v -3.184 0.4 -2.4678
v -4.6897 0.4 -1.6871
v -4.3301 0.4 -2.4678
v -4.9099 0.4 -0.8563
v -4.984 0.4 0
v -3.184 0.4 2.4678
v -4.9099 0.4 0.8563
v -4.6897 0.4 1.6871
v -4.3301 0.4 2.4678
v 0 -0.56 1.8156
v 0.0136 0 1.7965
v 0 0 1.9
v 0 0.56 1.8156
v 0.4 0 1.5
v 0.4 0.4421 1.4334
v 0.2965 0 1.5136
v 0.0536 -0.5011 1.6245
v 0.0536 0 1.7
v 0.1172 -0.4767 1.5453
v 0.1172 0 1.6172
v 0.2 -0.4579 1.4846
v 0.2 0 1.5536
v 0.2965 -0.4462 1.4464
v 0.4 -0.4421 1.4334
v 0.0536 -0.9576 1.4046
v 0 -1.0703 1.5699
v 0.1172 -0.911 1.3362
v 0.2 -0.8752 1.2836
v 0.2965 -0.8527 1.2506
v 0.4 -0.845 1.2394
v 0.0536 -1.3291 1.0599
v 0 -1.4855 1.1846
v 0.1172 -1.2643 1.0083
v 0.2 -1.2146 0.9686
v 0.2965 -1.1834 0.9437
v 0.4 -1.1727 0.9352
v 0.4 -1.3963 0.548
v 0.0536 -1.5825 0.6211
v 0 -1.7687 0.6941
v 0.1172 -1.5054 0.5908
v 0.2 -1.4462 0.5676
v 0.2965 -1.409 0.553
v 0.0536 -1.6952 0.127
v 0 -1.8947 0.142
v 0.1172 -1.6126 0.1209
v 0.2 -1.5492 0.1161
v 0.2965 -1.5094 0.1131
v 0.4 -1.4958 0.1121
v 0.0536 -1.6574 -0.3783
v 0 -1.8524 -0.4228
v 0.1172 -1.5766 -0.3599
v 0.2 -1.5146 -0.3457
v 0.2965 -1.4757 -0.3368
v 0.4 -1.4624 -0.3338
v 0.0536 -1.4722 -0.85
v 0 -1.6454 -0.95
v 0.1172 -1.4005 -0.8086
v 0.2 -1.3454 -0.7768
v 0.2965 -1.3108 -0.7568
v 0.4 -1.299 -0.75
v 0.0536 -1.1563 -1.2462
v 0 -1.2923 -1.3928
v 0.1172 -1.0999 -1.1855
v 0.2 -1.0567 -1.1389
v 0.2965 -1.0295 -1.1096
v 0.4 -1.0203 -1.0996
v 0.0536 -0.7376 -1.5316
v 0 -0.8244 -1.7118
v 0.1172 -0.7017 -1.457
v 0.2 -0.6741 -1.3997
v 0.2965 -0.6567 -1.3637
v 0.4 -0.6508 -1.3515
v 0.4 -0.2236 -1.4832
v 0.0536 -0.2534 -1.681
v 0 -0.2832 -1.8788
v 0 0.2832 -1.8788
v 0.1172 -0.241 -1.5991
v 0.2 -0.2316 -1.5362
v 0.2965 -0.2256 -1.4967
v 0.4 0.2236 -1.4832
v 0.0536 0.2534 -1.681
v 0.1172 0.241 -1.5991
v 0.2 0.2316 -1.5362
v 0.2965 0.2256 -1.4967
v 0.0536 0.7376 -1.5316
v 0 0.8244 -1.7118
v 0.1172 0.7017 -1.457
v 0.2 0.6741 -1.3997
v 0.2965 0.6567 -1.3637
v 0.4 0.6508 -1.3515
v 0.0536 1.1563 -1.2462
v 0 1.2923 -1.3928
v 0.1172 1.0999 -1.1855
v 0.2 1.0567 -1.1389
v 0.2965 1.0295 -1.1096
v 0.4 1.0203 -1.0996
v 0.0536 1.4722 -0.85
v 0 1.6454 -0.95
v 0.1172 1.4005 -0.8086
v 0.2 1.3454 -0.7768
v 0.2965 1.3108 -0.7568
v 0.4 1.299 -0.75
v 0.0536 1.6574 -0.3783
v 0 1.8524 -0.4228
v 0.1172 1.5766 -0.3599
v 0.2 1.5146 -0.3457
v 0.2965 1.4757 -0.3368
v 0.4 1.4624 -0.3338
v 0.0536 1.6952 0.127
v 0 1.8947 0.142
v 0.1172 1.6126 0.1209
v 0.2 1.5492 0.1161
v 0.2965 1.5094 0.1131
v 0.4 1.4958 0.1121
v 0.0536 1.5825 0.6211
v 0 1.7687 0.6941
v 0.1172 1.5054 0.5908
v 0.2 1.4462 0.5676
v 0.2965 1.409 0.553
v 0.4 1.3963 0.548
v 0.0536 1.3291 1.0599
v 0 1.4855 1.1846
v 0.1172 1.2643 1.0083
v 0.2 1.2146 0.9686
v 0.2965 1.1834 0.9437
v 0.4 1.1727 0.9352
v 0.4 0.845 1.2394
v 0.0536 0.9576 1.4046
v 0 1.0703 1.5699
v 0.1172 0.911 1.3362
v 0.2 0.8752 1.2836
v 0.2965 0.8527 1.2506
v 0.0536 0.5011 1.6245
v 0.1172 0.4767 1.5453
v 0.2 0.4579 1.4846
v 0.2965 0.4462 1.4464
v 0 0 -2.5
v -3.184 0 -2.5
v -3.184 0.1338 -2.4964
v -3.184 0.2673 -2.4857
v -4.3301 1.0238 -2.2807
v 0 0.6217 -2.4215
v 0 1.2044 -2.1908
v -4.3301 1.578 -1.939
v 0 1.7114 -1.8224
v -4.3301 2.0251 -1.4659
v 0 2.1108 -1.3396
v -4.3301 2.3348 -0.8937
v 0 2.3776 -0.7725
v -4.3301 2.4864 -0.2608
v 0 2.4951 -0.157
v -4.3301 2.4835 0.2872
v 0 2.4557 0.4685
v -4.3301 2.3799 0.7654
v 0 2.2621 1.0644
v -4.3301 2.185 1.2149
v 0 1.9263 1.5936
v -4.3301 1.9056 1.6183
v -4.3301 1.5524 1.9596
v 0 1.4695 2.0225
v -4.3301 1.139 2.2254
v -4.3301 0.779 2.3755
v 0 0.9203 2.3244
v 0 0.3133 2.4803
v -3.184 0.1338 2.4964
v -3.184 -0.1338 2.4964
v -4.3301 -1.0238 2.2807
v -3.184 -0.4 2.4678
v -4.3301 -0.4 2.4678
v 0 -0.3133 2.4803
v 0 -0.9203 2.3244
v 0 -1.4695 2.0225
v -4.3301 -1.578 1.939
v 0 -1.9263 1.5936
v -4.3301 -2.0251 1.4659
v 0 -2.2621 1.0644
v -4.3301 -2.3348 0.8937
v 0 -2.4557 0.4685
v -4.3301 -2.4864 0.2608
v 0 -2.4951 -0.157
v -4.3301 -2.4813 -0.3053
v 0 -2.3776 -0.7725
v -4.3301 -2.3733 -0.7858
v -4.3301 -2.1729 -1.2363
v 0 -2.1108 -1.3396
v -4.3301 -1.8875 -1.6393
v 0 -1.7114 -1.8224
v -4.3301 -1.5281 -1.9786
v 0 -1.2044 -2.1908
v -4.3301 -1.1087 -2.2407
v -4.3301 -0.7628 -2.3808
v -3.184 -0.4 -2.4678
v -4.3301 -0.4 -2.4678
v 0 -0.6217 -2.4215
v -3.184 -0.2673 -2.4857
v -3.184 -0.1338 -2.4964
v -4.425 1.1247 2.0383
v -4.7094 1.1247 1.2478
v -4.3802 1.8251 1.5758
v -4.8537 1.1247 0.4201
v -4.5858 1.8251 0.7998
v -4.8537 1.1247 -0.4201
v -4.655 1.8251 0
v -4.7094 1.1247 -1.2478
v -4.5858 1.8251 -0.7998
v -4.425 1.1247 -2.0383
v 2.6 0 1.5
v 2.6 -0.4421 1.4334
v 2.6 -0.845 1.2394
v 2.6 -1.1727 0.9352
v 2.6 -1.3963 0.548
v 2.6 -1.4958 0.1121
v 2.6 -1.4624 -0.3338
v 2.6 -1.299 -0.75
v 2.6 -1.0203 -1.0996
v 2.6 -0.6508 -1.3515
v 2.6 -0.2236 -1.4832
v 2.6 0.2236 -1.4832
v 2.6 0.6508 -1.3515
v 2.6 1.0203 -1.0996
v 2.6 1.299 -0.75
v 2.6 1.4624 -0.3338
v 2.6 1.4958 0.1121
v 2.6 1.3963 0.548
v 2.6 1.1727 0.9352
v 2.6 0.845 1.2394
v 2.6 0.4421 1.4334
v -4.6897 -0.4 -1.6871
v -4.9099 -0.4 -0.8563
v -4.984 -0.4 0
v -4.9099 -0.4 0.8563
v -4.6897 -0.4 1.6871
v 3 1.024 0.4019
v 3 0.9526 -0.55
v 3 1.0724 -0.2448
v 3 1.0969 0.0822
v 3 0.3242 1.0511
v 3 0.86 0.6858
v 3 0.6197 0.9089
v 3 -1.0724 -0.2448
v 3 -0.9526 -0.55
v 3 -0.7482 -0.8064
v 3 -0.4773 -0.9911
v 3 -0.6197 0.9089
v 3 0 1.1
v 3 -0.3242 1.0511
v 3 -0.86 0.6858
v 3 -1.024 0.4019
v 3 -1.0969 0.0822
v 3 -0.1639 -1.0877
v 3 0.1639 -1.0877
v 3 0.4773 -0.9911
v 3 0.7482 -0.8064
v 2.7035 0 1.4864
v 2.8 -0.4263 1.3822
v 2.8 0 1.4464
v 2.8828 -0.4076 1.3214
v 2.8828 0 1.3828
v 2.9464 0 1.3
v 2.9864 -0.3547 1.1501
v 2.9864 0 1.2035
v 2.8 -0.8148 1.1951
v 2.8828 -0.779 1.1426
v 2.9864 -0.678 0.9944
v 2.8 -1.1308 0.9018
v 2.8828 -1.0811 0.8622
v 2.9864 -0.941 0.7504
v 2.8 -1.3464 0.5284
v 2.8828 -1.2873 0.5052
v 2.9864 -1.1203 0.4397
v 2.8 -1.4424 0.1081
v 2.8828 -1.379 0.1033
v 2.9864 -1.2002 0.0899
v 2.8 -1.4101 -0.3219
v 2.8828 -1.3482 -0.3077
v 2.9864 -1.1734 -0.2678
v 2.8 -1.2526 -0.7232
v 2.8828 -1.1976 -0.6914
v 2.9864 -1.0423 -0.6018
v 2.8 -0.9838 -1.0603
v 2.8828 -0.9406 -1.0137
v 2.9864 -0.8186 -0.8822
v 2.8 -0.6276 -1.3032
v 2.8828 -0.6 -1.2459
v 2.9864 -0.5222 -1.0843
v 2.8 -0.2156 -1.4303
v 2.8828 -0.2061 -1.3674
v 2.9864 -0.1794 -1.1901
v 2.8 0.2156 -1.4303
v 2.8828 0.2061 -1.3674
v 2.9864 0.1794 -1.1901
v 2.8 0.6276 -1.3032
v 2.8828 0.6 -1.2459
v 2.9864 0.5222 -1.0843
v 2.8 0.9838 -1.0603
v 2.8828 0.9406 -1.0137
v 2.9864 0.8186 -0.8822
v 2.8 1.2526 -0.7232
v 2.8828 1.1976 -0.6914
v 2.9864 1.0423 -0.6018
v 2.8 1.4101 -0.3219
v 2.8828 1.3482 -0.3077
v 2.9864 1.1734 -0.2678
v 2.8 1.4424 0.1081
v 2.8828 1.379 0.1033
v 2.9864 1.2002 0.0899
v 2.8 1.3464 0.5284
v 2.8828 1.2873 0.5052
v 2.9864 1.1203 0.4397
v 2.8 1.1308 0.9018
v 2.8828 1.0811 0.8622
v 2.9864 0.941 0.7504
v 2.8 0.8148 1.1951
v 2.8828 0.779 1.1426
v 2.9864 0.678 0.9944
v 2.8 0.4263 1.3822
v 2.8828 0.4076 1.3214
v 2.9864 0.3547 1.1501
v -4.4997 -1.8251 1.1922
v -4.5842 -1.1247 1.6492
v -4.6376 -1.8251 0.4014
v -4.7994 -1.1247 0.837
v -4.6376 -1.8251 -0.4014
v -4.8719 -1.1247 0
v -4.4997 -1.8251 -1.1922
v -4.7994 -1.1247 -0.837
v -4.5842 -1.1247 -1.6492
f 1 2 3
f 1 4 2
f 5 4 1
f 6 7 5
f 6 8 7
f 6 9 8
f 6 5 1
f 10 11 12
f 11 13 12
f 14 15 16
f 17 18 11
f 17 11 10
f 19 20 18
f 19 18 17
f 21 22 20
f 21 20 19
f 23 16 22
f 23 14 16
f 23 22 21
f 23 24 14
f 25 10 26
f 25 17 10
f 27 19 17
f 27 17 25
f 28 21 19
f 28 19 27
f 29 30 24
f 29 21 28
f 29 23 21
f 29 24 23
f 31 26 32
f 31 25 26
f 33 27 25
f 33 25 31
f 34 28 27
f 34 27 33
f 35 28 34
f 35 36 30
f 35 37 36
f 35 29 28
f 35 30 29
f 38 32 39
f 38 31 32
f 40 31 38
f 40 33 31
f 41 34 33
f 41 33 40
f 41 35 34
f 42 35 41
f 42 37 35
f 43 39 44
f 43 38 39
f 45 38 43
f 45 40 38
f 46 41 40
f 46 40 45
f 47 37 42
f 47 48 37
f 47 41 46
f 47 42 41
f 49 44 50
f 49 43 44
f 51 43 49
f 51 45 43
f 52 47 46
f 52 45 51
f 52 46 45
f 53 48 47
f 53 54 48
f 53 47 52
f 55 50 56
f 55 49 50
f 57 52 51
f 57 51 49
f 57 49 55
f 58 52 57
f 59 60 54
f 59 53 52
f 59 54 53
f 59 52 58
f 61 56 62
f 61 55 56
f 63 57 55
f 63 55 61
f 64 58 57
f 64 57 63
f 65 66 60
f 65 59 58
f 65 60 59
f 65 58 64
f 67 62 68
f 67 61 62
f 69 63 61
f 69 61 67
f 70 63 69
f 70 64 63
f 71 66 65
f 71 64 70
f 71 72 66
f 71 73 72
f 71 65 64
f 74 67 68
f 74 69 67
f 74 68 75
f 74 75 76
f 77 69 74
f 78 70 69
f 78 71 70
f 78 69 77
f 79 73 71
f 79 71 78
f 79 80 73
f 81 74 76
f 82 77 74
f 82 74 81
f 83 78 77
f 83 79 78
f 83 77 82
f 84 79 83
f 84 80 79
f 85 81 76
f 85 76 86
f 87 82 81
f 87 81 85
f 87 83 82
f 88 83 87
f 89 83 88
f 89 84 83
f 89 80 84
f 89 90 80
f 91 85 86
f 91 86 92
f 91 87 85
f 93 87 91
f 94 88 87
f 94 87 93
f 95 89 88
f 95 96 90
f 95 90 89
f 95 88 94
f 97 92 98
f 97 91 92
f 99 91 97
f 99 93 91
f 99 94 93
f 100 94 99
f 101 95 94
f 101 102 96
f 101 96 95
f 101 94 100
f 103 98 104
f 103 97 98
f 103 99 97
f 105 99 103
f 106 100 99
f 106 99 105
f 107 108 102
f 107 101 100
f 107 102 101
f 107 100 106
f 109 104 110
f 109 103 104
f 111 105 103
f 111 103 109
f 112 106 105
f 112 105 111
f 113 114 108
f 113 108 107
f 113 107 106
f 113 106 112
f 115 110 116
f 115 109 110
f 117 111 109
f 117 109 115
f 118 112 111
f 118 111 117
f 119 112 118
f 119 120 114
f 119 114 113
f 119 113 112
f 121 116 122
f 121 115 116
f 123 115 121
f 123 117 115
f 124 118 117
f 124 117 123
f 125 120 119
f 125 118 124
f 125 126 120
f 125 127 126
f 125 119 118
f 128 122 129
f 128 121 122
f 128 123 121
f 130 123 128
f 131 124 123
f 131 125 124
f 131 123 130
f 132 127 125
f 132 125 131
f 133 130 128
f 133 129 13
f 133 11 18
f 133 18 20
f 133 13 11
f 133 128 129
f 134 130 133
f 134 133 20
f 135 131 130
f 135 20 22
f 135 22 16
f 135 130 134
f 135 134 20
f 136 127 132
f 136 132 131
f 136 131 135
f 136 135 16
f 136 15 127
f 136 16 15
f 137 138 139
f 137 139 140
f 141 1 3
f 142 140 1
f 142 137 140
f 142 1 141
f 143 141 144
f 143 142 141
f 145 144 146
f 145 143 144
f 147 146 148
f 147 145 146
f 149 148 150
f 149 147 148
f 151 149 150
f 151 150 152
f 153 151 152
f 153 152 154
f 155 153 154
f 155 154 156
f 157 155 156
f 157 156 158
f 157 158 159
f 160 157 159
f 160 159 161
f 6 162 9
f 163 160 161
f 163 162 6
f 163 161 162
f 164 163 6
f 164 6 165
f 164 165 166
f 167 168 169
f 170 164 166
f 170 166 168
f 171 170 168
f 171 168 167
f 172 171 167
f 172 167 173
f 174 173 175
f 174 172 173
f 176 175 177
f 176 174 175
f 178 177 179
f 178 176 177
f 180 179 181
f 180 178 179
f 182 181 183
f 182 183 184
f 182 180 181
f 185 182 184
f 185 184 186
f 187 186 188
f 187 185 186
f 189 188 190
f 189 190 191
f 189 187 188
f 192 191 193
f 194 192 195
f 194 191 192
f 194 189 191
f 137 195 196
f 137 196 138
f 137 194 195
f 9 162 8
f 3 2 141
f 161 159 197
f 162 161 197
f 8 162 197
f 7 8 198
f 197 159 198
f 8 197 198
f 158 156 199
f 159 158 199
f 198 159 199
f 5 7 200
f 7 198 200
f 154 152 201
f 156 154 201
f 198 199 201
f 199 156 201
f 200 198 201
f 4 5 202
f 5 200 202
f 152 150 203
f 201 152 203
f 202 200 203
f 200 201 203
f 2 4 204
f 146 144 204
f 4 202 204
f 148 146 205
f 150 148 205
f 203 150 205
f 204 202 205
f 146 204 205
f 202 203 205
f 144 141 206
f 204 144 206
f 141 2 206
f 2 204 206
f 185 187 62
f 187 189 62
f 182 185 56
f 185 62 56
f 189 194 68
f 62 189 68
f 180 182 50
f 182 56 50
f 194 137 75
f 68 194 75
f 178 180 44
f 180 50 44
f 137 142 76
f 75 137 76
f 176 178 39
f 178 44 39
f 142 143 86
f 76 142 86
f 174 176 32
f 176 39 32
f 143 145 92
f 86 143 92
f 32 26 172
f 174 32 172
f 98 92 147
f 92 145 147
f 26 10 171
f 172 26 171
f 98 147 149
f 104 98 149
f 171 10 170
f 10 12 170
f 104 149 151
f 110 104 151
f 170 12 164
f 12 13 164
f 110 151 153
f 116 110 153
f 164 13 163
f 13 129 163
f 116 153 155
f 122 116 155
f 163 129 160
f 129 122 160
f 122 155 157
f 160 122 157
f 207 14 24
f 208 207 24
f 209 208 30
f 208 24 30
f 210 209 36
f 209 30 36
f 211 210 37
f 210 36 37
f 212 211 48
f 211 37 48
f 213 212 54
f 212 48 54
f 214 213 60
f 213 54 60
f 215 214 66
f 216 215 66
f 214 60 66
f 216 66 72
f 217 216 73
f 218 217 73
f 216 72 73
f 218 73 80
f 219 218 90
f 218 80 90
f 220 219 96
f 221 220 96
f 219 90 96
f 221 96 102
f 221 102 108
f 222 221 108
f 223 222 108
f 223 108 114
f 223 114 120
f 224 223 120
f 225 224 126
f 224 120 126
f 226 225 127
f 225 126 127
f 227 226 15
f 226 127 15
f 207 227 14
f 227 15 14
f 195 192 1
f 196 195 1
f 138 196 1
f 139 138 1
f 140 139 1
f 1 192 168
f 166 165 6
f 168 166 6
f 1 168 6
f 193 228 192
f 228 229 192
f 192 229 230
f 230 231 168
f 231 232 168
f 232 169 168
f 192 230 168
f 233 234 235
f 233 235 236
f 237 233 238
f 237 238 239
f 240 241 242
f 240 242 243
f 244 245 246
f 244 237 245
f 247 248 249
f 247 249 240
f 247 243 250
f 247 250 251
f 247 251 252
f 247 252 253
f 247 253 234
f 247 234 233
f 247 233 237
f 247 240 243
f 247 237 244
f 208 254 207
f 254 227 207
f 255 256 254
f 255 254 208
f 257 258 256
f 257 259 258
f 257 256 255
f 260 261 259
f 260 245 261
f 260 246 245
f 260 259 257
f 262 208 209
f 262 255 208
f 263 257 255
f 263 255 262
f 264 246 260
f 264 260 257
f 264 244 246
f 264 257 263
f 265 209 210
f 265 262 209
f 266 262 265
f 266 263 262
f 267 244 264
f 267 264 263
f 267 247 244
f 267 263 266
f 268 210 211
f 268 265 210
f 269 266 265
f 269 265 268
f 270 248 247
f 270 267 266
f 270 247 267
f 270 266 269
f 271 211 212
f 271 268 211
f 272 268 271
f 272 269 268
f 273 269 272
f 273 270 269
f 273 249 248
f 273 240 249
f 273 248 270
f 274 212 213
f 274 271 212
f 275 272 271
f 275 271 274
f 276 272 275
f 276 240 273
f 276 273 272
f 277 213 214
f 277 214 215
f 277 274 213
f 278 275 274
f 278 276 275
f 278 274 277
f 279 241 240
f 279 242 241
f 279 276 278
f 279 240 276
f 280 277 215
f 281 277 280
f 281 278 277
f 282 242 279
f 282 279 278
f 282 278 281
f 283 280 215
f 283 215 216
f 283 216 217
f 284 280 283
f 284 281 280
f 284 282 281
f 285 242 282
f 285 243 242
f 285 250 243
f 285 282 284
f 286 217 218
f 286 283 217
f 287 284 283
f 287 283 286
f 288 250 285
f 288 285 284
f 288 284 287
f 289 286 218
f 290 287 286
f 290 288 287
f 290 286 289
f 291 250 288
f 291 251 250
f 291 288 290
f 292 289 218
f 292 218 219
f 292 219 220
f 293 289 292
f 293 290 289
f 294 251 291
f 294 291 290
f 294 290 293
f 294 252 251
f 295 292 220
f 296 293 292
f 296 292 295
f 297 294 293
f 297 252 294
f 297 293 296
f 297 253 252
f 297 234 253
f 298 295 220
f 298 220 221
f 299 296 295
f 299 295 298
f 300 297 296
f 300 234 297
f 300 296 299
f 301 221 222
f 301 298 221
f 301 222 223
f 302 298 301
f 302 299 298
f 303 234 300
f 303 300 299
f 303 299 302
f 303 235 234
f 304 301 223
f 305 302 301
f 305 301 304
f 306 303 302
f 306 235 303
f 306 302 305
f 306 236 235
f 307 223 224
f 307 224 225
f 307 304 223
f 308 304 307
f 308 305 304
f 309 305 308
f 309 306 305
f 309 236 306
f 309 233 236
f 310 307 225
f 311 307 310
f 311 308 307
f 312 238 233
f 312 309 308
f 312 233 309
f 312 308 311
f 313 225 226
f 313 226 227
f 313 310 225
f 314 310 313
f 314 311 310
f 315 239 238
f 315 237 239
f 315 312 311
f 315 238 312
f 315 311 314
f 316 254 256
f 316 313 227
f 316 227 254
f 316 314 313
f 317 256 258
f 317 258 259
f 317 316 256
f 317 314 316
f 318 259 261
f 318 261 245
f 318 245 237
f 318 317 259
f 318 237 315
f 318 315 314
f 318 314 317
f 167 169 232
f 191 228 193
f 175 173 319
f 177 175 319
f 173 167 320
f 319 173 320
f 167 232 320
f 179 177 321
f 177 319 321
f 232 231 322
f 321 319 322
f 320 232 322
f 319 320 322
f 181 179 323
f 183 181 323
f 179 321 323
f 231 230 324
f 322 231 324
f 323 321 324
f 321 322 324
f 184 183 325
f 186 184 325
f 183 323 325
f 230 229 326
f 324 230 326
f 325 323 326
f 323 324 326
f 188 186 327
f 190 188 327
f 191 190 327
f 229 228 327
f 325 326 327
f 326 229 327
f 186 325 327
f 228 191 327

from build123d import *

# Parameters (mm, degrees)
REVOLVE_1_ANGLE     = 180
SKETCH_2_R          = 1.5
EXTRUDE_1_DEPTH     = 3
FILLET_1_R          = 0.4
SKETCH_3_OUTSIDE_W  = 15.25
SKETCH_3_OUTSIDE_H  = 15.25
SKETCH_3_OUTSIDE_R  = 2.5
CUT_EXTRUDE_1_DEPTH = 43
SKETCH_4_W          = 2.409556496
SKETCH_4_H          = 0.8
CUT_EXTRUDE_2_DEPTH = 21.5


with BuildPart() as part:
    # 草图1 → 旋转1 (revolve)
    with BuildSketch(Plane(origin=(0, 0, 0), x_dir=(0, 0, -1), z_dir=(1, 0, 0))):
        with BuildLine():
            Line((0, 5), (0, -5))
            ThreePointArc((0, -5), (-5, 0), (0, 5))
        make_face()
    revolve(axis=Axis((0, 5, 0), (0, -1, 0)), revolution_arc=REVOLVE_1_ANGLE)

    # 草图2 → 凸台-拉伸1 (add)
    with BuildSketch(Plane(origin=(0, 0, 0), x_dir=(0, 0, -1), z_dir=(1, 0, 0))):
        with Locations(Location((0, 0, 0), (0, 0, 180))):
            Circle(SKETCH_2_R)
    extrude(amount=EXTRUDE_1_DEPTH)

    # 圆角1
    fillet_1_edges = [part.edges().sort_by_distance(p)[0] for p in [
        (0, 0, -1.5),
        (3, 0, -1.5),
    ]]
    fillet(fillet_1_edges, radius=FILLET_1_R)

    # 草图3 outside → 切除-拉伸1 (cut)
    with BuildSketch(Plane(origin=(0, 0, 0), x_dir=(0, 0, -1), z_dir=(1, 0, 0))):
        Rectangle(SKETCH_3_OUTSIDE_W, SKETCH_3_OUTSIDE_H)
        Circle(SKETCH_3_OUTSIDE_R, mode=Mode.SUBTRACT)
    extrude(amount=-CUT_EXTRUDE_1_DEPTH, mode=Mode.SUBTRACT)

    # 草图4 → 切除-拉伸2 (cut, symmetric)
    with BuildSketch(Plane.XY):
        with Locations((-4.388752566, 0)):
            Rectangle(SKETCH_4_W, SKETCH_4_H)
    extrude(amount=CUT_EXTRUDE_2_DEPTH, both=True, mode=Mode.SUBTRACT)


solid = part.part
